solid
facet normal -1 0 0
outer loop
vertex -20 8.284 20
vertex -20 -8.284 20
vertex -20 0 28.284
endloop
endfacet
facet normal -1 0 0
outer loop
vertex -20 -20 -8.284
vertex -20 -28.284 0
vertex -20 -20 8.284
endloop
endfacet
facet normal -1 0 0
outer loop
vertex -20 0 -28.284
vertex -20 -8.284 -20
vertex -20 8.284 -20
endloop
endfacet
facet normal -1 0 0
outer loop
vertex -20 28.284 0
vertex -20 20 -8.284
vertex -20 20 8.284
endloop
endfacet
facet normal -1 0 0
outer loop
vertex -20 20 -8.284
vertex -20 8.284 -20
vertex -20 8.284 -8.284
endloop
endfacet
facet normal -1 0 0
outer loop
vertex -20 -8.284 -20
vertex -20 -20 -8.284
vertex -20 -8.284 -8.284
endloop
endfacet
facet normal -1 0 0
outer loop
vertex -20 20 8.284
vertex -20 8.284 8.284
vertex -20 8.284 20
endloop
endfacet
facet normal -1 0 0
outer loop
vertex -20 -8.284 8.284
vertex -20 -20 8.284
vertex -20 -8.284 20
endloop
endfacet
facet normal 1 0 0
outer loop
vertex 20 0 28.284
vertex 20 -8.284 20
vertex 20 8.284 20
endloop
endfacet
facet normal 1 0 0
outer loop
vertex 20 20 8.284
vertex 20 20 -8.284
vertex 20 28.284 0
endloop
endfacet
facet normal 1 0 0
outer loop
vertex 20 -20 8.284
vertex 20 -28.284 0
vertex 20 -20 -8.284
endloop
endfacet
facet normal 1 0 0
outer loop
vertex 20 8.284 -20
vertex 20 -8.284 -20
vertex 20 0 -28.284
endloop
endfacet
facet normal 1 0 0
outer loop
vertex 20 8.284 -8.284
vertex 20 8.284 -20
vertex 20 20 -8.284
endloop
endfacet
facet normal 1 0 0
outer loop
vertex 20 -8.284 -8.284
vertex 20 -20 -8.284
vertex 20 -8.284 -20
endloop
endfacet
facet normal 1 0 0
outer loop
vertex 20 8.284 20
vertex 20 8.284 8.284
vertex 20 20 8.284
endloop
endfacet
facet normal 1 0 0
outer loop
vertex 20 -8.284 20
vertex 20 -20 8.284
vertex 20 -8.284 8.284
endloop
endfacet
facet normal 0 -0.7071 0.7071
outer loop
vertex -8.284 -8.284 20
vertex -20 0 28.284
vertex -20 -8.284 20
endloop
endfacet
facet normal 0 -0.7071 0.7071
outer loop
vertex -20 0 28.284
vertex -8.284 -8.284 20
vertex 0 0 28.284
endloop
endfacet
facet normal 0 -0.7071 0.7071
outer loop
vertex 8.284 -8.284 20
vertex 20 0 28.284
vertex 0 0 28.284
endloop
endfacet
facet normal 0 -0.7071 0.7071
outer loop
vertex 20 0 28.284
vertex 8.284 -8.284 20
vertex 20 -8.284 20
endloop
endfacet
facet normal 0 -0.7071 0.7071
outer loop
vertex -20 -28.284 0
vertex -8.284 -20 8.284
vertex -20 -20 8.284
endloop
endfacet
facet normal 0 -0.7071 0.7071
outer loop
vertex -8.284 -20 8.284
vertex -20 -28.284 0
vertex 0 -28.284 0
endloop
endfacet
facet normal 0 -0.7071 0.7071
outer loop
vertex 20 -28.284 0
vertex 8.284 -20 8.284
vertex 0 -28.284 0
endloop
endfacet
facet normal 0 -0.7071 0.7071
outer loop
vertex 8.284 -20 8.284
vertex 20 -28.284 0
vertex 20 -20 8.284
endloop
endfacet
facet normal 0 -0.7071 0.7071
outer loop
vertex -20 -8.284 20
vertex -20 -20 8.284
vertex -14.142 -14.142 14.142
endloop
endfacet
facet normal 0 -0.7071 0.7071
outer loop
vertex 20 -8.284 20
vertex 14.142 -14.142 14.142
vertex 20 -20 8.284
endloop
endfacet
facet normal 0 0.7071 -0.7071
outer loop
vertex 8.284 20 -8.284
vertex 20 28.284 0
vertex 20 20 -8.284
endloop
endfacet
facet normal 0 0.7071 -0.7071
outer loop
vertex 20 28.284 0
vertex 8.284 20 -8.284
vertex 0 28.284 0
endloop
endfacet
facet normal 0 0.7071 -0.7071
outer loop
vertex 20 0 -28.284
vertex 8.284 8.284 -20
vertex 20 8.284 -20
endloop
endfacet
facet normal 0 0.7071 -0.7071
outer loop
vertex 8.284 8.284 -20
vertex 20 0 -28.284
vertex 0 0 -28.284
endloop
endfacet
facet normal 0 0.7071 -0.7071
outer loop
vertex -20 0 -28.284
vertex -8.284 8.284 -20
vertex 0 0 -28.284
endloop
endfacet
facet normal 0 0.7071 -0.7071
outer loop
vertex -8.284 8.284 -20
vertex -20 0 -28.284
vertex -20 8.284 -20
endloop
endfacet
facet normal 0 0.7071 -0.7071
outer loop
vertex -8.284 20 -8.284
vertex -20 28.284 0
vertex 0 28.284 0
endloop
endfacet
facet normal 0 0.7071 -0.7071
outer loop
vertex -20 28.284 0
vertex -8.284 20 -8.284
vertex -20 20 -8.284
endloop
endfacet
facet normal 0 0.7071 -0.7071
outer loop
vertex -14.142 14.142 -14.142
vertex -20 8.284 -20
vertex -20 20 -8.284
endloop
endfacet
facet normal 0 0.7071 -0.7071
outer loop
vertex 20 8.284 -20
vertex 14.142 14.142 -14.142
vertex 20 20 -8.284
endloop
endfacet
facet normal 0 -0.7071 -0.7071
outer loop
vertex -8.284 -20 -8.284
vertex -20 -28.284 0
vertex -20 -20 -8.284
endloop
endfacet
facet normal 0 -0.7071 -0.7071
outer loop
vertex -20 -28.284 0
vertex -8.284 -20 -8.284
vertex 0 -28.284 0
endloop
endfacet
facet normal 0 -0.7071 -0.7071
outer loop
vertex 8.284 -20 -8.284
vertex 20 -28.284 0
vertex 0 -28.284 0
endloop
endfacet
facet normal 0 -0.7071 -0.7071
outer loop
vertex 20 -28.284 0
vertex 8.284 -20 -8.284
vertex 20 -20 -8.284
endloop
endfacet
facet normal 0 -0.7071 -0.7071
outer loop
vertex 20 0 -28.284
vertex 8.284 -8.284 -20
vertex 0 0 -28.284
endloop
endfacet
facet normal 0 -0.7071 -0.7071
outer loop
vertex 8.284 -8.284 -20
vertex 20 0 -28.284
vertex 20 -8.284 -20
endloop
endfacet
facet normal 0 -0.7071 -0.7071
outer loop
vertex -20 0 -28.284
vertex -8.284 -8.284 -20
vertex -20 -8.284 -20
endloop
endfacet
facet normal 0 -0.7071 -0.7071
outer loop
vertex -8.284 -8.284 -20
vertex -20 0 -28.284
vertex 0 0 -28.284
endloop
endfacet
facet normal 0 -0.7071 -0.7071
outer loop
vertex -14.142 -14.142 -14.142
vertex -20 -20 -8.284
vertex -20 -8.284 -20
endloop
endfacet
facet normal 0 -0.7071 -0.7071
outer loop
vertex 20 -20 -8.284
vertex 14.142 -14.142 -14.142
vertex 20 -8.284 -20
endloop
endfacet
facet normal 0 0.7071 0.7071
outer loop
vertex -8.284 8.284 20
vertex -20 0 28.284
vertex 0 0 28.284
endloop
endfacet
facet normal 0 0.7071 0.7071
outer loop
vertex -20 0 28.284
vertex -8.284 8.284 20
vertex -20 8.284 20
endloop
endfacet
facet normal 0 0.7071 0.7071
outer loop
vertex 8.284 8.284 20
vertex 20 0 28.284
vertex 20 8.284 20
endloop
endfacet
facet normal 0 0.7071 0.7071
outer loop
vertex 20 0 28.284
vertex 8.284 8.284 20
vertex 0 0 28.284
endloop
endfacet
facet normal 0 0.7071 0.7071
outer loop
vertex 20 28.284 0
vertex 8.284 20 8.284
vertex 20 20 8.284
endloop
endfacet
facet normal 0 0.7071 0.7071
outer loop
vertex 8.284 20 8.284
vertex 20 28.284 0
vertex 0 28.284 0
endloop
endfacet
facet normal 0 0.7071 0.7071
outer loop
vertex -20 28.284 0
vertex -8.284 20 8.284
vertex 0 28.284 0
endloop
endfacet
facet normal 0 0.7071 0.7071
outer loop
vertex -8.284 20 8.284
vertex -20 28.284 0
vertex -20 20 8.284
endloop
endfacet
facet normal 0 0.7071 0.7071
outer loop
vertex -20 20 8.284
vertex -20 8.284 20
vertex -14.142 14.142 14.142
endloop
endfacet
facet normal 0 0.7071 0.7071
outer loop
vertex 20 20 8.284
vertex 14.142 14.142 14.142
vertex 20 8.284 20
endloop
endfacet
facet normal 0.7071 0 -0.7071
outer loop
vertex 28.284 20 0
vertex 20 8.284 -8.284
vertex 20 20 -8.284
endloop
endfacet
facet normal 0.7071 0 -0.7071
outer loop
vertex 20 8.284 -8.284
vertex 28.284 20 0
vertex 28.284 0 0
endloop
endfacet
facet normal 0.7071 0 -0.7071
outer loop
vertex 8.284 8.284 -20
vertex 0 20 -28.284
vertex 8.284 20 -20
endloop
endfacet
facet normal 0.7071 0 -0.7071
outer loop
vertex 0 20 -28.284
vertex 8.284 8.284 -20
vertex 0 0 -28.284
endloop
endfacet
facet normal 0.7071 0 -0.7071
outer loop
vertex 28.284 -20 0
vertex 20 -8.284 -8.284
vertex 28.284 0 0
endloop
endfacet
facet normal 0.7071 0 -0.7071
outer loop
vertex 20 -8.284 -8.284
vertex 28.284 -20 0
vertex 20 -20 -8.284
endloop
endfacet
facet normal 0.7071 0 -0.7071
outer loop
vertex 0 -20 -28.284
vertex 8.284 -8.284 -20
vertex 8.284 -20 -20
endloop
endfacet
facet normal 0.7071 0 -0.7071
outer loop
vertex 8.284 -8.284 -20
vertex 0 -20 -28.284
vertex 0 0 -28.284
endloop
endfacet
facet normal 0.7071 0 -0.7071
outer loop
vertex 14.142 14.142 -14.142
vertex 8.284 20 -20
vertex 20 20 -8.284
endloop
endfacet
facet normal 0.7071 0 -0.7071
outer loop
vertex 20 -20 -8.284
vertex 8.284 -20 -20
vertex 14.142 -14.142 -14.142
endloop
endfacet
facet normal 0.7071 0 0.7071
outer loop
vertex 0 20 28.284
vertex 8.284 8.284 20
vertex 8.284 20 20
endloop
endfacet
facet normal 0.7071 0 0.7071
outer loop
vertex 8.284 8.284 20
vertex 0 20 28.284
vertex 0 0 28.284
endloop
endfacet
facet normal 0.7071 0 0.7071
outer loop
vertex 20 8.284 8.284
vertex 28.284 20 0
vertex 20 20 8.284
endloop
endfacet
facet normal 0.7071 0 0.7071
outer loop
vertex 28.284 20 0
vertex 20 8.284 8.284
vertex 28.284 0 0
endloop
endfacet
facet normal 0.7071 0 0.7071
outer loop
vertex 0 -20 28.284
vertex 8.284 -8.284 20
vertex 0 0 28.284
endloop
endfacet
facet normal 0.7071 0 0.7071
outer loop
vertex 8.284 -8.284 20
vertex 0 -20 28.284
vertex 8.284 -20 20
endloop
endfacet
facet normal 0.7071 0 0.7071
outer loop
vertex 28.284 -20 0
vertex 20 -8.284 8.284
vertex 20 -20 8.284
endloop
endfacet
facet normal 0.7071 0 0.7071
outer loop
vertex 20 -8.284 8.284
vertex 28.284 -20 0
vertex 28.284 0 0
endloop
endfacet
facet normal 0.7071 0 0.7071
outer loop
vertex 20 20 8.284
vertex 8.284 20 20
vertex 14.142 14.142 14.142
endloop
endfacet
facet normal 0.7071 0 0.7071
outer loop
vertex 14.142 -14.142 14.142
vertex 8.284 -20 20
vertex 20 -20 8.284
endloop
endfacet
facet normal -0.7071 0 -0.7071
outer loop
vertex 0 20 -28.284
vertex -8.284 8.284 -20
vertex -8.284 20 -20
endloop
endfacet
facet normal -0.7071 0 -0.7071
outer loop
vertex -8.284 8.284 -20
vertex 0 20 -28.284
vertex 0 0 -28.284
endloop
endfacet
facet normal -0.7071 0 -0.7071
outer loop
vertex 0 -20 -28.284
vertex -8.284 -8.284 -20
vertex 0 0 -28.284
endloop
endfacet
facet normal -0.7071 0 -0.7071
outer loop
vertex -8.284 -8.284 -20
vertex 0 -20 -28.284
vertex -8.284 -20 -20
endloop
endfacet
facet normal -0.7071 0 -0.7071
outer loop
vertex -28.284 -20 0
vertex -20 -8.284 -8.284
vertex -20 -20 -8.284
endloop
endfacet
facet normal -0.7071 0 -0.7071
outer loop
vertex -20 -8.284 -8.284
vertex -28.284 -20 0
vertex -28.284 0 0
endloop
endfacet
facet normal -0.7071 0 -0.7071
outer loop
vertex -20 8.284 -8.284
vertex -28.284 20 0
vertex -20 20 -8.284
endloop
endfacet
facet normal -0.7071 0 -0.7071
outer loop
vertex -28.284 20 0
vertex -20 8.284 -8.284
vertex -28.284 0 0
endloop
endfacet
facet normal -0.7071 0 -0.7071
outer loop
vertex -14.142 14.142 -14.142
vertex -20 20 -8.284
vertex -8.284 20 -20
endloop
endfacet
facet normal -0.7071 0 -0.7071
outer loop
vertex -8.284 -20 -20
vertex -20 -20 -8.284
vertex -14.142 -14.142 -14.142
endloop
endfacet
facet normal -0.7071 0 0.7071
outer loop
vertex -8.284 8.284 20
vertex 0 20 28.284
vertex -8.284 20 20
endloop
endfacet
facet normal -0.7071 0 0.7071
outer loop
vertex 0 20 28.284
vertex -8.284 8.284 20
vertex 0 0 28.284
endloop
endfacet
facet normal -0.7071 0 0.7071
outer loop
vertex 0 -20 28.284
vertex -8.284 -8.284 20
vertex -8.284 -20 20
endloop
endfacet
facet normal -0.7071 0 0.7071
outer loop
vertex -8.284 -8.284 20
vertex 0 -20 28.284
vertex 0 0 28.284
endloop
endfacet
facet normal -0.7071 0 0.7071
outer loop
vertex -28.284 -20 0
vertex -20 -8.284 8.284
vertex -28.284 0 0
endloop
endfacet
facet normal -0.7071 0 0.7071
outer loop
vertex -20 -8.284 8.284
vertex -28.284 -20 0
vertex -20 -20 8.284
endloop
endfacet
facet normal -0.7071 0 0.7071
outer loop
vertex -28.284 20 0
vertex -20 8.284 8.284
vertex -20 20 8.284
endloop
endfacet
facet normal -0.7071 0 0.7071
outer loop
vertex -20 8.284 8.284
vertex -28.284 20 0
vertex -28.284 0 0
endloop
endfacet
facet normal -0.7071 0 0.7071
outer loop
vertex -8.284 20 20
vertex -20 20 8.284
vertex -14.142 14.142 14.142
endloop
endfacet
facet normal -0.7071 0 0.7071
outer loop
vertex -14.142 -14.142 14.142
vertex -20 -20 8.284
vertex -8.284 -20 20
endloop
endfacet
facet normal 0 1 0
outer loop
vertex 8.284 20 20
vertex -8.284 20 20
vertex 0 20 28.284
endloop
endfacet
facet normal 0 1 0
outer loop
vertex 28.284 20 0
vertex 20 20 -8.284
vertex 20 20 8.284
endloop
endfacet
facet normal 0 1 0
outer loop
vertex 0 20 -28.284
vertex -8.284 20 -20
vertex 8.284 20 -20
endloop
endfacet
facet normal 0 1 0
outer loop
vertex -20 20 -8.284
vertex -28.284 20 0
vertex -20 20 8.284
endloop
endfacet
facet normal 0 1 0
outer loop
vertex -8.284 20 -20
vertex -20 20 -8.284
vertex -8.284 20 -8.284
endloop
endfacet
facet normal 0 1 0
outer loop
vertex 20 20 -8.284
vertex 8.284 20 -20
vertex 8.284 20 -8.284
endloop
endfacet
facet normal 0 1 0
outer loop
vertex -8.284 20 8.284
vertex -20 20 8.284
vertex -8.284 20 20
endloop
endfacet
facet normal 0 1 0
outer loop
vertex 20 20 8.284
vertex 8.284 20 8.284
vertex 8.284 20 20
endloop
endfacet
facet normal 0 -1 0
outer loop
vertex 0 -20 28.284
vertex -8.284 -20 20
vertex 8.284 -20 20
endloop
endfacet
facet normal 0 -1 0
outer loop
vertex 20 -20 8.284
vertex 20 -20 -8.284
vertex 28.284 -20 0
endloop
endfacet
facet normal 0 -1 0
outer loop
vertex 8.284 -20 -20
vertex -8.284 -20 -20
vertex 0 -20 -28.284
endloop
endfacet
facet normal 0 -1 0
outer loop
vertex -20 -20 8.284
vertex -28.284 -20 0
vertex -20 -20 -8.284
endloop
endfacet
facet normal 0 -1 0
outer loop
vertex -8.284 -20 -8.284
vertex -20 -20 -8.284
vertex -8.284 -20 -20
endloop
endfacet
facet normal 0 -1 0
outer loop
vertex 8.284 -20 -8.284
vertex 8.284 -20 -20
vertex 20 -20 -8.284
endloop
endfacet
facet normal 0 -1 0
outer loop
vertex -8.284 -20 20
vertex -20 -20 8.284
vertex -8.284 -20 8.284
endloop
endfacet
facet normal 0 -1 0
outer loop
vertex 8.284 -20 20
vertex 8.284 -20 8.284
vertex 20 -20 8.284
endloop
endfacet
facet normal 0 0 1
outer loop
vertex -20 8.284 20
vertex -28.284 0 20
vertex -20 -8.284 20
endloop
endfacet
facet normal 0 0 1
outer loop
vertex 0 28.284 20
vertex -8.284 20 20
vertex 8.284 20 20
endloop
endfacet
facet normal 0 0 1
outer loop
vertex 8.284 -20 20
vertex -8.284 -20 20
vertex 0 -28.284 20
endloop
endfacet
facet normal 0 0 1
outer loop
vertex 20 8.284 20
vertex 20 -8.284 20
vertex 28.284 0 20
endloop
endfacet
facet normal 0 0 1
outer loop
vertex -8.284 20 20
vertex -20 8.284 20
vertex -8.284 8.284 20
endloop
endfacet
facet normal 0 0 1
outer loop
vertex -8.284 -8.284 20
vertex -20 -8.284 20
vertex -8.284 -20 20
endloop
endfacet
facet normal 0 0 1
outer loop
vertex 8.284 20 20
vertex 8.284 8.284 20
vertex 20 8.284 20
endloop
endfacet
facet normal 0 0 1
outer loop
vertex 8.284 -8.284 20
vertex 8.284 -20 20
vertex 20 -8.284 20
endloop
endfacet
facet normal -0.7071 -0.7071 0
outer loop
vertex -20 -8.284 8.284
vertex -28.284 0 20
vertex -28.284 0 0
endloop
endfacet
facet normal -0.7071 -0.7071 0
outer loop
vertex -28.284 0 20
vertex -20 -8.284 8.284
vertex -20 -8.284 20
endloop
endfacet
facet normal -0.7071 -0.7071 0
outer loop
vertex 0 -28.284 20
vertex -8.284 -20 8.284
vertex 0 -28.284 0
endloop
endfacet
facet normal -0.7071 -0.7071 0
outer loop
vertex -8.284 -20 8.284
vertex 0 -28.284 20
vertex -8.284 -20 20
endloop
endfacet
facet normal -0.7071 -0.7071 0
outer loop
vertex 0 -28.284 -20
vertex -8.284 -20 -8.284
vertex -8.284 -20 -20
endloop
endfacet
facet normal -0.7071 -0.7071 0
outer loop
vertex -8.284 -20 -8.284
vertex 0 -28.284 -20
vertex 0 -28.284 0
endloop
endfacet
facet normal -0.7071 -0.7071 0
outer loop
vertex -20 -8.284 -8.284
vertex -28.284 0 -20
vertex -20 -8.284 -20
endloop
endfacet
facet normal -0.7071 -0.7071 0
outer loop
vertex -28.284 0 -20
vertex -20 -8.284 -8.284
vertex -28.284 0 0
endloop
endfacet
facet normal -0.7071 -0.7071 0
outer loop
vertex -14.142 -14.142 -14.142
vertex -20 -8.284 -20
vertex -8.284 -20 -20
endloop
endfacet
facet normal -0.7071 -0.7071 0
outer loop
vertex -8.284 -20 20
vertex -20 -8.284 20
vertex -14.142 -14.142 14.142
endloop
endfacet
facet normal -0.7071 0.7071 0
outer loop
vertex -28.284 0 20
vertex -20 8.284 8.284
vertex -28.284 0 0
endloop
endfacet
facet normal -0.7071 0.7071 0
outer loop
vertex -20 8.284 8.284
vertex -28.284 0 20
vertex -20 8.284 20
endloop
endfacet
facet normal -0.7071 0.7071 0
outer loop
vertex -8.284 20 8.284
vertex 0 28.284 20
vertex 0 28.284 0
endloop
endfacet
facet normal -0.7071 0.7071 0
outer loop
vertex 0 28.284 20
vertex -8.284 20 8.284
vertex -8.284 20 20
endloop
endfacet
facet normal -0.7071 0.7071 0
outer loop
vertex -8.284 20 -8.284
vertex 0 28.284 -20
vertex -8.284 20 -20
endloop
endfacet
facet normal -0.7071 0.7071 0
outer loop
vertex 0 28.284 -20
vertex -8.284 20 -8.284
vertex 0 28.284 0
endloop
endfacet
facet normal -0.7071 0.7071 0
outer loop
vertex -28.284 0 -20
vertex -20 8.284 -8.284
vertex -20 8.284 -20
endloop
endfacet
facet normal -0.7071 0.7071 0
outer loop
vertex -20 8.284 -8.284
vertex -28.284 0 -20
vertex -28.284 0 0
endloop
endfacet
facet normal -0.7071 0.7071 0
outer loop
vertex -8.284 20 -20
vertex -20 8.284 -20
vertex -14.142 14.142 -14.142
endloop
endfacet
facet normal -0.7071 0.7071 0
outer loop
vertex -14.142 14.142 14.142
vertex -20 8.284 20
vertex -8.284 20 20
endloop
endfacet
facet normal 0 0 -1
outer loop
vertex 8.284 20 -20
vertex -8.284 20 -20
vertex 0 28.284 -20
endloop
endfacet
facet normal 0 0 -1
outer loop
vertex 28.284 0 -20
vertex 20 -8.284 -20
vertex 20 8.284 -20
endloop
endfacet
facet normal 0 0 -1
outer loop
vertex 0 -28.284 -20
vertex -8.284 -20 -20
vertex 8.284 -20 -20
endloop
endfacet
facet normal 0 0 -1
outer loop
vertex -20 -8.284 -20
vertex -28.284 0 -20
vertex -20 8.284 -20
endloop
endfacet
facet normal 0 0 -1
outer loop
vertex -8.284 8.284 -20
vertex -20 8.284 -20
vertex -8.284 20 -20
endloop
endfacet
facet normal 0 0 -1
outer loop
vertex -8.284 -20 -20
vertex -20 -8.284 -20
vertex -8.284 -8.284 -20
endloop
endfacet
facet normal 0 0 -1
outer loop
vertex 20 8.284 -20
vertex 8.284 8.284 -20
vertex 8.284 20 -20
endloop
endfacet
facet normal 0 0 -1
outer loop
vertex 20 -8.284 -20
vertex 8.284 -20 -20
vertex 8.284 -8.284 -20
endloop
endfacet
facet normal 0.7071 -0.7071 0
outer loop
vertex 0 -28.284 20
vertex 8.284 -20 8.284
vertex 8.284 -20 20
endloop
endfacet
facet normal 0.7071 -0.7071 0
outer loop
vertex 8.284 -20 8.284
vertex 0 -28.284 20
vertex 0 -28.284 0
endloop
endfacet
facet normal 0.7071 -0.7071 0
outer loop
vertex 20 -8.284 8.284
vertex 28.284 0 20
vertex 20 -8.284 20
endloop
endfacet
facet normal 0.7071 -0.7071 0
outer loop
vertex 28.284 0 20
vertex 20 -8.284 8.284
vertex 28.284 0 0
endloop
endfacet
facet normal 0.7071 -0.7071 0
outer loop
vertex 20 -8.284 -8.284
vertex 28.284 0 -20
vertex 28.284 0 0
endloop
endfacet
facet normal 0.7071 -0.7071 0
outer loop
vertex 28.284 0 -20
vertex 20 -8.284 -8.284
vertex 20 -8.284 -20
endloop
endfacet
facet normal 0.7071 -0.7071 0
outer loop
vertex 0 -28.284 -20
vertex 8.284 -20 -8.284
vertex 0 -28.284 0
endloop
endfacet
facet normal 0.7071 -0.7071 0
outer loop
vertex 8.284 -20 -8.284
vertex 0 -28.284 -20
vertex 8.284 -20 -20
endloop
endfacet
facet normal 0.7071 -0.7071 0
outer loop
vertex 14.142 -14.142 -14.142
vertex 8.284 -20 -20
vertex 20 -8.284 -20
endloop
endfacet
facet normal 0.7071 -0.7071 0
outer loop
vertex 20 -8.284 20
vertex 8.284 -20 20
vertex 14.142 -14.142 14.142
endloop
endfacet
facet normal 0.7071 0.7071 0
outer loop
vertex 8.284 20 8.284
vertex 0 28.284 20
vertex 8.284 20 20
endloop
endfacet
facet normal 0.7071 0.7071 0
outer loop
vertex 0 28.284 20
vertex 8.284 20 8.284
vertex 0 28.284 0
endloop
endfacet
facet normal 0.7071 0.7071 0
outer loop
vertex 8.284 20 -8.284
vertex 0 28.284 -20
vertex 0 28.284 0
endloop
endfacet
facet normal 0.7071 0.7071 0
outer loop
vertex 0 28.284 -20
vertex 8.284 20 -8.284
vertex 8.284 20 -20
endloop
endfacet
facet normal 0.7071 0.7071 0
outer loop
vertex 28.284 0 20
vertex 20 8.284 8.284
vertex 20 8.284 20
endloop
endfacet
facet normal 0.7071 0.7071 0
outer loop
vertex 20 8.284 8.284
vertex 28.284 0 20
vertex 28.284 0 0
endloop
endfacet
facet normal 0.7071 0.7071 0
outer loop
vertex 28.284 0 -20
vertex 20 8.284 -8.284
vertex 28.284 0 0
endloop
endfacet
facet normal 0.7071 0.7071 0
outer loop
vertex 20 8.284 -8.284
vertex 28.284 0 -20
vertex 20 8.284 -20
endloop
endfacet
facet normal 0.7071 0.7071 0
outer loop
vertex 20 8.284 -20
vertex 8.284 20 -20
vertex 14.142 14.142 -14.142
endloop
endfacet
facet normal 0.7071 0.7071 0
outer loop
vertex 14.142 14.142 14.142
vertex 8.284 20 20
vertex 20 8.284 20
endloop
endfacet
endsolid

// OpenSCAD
rotate([45,0,0]) cube([40,40,40], true); 
rotate([0,45,0]) cube([40,40,40], true); 
rotate([0,0,45]) cube([40,40,40], true);
